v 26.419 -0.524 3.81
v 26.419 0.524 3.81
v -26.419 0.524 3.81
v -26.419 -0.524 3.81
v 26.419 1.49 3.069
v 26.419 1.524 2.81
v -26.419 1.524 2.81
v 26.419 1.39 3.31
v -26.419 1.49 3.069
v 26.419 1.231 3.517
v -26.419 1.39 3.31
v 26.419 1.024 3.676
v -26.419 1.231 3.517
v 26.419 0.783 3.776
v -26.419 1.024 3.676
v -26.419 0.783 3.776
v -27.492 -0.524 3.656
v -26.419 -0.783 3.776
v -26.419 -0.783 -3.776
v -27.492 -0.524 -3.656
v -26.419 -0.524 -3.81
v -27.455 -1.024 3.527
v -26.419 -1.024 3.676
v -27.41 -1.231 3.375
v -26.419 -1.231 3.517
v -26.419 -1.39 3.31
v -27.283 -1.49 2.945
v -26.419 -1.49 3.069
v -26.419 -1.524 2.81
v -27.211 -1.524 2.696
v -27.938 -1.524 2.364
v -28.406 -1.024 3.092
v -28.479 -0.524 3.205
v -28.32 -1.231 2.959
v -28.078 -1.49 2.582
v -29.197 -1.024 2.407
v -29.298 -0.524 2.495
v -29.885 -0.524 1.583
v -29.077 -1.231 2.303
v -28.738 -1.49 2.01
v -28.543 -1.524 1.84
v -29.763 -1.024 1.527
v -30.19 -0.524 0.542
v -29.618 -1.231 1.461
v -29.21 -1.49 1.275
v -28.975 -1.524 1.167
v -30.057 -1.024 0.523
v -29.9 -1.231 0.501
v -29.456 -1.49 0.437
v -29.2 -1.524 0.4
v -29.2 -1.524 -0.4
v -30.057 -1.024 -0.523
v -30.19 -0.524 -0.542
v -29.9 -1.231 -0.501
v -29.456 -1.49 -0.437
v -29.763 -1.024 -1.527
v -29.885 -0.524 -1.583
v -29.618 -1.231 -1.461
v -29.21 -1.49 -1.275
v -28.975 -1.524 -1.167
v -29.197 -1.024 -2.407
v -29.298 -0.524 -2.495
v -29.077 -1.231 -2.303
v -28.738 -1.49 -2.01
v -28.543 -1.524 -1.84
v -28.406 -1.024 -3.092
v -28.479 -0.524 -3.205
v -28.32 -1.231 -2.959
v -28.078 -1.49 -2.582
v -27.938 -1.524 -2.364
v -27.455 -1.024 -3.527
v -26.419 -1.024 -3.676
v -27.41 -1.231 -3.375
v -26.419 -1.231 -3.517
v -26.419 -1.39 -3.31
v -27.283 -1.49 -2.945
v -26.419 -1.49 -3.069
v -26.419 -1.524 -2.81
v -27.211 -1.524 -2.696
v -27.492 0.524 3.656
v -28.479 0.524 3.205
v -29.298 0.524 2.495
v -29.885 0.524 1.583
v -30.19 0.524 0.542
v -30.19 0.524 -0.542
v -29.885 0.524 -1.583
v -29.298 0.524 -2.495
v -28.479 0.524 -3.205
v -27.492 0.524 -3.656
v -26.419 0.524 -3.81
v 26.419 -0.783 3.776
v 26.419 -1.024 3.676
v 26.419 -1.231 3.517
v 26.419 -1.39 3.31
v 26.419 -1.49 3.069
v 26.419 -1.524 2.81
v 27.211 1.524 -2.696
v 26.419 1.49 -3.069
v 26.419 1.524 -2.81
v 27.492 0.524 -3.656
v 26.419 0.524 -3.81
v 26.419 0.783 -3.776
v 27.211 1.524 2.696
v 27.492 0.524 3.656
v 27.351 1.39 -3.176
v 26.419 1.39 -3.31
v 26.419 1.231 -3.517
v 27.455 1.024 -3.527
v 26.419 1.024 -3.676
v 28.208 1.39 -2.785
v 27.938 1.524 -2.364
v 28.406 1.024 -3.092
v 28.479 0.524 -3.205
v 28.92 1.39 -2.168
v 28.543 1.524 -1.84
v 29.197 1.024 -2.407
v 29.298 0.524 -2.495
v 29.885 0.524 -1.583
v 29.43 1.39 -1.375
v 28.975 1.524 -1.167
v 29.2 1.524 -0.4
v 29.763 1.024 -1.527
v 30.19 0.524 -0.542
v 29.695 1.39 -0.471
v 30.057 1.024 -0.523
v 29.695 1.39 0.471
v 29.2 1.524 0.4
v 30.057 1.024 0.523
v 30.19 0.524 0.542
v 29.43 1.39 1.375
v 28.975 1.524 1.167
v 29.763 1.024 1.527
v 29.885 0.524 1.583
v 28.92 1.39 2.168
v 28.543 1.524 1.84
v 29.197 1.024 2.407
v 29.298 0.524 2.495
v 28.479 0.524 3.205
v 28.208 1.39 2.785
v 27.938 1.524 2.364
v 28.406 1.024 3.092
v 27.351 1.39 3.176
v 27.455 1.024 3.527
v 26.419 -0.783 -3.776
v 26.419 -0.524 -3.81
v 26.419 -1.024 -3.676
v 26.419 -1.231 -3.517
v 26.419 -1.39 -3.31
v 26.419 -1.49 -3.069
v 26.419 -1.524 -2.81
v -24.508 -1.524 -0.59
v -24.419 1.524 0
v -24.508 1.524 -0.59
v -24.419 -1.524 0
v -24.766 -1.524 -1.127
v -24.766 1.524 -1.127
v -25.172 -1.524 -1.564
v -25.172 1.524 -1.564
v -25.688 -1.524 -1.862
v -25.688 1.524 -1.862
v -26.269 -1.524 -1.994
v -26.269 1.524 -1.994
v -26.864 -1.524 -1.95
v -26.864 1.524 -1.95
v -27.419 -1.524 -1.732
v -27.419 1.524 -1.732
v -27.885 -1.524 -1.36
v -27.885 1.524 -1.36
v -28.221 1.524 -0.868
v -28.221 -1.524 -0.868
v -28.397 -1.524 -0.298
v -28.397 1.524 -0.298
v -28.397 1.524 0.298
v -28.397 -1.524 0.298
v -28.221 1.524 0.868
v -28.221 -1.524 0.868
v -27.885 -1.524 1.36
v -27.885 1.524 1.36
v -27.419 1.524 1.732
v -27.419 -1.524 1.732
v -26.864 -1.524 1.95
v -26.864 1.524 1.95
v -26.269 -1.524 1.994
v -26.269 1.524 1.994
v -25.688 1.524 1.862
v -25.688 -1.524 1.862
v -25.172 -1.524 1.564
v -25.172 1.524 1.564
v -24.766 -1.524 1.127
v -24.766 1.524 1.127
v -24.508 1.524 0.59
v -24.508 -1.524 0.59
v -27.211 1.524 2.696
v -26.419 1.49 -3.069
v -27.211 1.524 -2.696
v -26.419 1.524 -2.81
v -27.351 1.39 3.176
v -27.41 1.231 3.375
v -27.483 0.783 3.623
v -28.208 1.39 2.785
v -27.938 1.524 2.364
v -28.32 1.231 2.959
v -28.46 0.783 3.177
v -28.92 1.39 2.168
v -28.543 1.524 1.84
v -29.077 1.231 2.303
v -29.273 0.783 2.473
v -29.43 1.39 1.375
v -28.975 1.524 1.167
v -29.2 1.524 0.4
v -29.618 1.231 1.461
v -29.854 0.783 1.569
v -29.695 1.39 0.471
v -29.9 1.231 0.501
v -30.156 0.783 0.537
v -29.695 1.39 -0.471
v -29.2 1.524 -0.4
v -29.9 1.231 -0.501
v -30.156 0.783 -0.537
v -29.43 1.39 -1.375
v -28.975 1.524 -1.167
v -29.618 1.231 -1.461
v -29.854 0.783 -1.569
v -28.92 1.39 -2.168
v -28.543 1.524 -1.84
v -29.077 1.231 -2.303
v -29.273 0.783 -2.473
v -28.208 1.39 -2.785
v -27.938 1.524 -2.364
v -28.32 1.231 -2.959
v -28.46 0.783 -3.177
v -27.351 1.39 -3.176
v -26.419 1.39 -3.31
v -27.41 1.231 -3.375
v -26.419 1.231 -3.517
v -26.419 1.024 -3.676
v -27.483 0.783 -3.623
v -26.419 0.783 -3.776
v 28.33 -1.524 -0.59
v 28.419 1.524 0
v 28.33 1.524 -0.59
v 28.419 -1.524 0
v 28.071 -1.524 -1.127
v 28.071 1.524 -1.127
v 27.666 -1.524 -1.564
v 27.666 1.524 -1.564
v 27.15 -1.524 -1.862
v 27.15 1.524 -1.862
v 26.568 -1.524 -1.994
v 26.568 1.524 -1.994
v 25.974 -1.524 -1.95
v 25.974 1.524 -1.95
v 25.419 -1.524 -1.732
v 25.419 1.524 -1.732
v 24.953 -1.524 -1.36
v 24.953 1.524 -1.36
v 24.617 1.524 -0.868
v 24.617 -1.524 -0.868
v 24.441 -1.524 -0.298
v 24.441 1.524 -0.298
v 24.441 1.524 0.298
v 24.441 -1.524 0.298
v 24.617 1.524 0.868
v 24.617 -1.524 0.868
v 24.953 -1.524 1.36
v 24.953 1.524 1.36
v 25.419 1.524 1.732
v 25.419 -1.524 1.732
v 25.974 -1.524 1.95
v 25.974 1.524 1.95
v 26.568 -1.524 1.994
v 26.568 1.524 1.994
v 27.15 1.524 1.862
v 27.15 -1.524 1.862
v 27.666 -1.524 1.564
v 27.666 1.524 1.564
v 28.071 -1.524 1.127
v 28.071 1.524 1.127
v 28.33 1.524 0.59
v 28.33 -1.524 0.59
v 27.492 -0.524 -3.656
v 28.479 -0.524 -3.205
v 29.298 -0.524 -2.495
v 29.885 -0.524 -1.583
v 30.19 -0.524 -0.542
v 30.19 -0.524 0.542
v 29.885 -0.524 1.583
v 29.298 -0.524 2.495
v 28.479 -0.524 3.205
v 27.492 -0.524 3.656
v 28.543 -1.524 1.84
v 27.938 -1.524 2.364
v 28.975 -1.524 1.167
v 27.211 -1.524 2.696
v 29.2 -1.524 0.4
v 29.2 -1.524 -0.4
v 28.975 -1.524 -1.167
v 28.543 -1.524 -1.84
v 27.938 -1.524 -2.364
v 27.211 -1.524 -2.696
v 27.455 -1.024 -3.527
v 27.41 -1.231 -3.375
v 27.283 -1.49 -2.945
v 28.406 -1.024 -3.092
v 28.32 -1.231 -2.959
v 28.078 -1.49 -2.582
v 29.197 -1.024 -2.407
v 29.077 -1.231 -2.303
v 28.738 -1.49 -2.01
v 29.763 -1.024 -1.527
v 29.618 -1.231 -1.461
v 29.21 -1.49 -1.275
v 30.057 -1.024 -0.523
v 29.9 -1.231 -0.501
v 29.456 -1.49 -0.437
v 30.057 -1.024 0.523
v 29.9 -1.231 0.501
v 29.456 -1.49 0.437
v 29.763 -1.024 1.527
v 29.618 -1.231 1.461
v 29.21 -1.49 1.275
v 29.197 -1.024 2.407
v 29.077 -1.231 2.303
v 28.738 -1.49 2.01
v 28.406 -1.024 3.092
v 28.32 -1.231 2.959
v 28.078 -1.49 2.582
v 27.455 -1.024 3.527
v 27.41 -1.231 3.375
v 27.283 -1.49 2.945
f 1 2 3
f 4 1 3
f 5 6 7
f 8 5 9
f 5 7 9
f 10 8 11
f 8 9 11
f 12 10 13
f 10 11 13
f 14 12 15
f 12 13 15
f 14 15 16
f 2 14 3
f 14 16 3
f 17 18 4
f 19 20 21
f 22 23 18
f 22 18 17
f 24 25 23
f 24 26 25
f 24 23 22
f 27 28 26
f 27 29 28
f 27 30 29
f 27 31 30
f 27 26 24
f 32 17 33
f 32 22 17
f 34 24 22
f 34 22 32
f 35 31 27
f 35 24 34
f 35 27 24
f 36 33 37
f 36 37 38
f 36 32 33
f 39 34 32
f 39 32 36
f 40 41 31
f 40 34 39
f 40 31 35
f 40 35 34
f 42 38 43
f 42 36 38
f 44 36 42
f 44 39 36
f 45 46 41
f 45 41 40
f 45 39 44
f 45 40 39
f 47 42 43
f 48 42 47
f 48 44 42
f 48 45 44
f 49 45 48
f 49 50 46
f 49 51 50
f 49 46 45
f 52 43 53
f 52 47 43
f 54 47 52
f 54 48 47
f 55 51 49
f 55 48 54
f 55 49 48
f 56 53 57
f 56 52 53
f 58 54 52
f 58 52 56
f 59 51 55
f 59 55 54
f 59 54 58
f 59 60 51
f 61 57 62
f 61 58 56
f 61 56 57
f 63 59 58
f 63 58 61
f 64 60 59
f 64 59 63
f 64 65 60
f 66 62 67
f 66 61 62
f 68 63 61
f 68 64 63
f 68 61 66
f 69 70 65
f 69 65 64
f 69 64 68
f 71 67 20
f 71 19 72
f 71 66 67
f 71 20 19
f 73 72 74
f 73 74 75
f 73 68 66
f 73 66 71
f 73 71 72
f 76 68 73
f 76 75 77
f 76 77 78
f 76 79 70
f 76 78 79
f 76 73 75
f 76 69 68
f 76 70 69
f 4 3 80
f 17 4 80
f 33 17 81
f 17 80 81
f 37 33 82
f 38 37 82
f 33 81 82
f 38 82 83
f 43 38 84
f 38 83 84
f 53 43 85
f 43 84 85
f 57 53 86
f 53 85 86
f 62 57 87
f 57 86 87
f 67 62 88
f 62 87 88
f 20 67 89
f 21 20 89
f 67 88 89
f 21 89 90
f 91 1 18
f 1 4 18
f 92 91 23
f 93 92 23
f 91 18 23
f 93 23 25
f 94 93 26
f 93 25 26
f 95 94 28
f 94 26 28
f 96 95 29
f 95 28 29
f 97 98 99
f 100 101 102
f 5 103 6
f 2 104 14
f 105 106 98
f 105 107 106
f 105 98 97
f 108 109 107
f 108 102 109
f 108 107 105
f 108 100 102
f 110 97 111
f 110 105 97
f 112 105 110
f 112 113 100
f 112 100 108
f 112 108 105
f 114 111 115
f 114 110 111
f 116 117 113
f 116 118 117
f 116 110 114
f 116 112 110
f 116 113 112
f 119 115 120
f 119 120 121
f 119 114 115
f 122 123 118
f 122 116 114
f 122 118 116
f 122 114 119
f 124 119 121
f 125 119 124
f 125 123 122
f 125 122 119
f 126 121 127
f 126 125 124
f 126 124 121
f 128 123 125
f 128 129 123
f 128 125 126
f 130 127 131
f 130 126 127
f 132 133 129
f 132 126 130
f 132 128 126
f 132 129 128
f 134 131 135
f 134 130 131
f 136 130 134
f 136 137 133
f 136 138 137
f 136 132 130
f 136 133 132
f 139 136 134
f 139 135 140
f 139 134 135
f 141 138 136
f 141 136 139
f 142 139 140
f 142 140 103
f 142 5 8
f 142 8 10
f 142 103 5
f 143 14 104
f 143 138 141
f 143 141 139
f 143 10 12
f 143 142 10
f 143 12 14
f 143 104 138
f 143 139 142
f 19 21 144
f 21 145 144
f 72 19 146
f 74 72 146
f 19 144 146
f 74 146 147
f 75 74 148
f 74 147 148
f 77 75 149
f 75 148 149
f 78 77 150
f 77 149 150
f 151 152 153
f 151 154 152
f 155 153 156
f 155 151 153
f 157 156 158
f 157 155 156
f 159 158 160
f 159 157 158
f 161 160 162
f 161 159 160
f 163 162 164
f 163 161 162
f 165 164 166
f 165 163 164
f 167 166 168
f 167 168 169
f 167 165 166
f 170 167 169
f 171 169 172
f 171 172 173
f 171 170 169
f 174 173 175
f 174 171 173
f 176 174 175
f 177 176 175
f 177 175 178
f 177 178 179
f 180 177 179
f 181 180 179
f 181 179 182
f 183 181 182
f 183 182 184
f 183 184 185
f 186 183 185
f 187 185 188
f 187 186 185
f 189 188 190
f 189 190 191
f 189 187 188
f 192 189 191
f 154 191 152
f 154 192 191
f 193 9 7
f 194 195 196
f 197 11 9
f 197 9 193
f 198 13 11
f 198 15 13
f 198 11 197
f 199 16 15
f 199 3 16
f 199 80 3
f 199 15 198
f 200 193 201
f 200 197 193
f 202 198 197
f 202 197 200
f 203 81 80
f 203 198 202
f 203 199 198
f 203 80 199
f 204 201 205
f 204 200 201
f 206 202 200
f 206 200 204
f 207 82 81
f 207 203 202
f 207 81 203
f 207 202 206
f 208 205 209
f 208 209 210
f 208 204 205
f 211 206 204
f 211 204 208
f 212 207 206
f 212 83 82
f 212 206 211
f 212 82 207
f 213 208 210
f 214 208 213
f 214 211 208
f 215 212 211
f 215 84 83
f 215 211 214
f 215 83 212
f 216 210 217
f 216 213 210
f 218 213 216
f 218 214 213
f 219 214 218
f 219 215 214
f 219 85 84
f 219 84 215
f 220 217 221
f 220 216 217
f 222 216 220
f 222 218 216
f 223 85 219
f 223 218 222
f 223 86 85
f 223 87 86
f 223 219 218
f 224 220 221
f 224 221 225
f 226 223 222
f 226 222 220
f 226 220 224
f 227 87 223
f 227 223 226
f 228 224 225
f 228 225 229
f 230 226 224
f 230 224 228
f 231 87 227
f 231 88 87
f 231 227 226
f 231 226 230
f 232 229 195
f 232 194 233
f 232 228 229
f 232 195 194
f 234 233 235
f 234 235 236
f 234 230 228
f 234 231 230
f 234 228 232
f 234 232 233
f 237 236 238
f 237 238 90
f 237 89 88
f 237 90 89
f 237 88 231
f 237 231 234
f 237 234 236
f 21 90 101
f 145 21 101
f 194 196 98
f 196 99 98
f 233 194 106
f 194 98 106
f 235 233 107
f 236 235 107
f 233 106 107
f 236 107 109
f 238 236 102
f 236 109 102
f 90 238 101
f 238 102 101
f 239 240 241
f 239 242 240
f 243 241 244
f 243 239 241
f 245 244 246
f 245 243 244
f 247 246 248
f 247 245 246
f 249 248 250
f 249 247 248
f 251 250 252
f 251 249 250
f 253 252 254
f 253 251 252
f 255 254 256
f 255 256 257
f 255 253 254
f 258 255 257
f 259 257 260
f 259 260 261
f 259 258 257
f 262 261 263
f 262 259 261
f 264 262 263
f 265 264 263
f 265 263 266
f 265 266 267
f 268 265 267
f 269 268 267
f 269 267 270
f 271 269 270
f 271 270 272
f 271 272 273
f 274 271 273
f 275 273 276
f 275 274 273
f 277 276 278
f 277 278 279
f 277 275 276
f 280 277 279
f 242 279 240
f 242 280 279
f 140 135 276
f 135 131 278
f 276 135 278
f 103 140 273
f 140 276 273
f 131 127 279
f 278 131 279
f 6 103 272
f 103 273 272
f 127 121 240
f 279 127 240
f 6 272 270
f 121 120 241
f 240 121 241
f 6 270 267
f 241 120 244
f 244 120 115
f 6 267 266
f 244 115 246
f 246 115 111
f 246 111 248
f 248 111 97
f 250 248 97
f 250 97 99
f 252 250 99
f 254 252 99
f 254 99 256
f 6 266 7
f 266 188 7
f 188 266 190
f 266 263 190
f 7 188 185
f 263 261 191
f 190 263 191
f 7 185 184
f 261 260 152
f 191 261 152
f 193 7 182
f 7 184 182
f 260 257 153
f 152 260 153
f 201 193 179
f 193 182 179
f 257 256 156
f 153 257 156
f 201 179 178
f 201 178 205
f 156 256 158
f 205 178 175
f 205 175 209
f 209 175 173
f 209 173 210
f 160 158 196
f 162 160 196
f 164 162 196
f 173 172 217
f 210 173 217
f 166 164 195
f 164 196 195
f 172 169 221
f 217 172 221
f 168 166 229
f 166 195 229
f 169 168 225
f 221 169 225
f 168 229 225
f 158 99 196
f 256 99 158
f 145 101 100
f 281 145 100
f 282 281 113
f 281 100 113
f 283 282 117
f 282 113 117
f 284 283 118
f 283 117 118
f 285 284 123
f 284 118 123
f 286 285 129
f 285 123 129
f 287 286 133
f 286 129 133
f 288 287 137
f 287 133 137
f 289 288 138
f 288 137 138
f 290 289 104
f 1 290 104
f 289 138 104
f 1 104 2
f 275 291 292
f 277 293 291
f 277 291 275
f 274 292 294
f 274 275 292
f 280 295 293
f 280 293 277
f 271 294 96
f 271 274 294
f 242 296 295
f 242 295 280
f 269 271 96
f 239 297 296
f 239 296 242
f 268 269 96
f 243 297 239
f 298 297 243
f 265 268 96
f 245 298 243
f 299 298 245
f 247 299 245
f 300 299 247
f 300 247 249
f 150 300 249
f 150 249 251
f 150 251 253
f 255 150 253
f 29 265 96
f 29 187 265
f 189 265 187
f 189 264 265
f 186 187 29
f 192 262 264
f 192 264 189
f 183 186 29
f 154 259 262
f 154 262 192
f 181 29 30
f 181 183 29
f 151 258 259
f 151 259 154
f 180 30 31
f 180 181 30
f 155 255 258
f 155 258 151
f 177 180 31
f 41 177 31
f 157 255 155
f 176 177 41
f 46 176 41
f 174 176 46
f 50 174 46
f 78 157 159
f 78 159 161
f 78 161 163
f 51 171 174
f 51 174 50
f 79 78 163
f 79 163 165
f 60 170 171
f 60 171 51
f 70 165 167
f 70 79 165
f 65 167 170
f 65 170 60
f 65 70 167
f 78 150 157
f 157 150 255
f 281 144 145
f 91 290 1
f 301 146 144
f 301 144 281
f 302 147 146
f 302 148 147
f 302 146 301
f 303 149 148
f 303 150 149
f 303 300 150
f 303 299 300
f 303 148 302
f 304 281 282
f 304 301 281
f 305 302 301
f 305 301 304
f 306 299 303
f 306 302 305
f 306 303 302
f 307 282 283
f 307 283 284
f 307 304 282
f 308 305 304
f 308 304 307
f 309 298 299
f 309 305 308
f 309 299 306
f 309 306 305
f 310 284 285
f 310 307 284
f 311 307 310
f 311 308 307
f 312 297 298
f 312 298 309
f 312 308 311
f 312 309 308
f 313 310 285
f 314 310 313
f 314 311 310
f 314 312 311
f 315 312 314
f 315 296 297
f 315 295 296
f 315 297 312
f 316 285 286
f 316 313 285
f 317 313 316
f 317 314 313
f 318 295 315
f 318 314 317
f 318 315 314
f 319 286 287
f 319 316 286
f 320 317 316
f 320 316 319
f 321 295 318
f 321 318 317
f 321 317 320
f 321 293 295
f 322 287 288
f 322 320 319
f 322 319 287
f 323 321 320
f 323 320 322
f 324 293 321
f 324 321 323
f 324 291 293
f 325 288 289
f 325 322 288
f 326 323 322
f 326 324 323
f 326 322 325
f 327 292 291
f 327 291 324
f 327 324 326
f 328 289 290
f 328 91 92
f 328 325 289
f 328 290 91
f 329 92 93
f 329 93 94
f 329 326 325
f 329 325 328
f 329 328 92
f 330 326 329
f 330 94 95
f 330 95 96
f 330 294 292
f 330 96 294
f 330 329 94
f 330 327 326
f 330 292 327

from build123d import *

# Parameters (mm, degrees)
SKETCH1_R           = 2
BOSS_EXTRUDE1_DEPTH = 1.524
FILLET1_R           = 1


with BuildPart() as part:
    # Sketch1 → Boss-Extrude1 (new body, symmetric)
    with BuildSketch(Plane(origin=(0, 0, 0), x_dir=(1, 0, 0), z_dir=(0, 1, 0))):
        with BuildLine():
            Line((-26.418872232, 3.81), (26.418872232, 3.81))
            ThreePointArc((26.418872232, 3.81), (30.228872232, 0), (26.418872232, -3.81))
            Line((26.418872232, -3.81), (-26.418872232, -3.81))
            ThreePointArc((-26.418872232, -3.81), (-30.228872232, 0), (-26.418872232, 3.81))
        make_face()
        with Locations((-26.418872232, 0)):
            Circle(SKETCH1_R, mode=Mode.SUBTRACT)
        with Locations((26.418872232, 0)):
            Circle(SKETCH1_R, mode=Mode.SUBTRACT)
    extrude(amount=BOSS_EXTRUDE1_DEPTH, both=True)

    # Fillet1
    fillet1_edges = [part.edges().sort_by_distance(p)[0] for p in [
        (30.228872232, 1.524, 0),
        (0, 1.524, -3.81),
        (-30.228872232, 1.524, 0),
        (0, -1.524, -3.81),
        (30.228872232, -1.524, 0),
        (0, -1.524, 3.81),
        (-30.228872232, -1.524, 0),
        (0, 1.524, 3.81),
    ]]
    fillet(fillet1_edges, radius=FILLET1_R)


solid = part.part
